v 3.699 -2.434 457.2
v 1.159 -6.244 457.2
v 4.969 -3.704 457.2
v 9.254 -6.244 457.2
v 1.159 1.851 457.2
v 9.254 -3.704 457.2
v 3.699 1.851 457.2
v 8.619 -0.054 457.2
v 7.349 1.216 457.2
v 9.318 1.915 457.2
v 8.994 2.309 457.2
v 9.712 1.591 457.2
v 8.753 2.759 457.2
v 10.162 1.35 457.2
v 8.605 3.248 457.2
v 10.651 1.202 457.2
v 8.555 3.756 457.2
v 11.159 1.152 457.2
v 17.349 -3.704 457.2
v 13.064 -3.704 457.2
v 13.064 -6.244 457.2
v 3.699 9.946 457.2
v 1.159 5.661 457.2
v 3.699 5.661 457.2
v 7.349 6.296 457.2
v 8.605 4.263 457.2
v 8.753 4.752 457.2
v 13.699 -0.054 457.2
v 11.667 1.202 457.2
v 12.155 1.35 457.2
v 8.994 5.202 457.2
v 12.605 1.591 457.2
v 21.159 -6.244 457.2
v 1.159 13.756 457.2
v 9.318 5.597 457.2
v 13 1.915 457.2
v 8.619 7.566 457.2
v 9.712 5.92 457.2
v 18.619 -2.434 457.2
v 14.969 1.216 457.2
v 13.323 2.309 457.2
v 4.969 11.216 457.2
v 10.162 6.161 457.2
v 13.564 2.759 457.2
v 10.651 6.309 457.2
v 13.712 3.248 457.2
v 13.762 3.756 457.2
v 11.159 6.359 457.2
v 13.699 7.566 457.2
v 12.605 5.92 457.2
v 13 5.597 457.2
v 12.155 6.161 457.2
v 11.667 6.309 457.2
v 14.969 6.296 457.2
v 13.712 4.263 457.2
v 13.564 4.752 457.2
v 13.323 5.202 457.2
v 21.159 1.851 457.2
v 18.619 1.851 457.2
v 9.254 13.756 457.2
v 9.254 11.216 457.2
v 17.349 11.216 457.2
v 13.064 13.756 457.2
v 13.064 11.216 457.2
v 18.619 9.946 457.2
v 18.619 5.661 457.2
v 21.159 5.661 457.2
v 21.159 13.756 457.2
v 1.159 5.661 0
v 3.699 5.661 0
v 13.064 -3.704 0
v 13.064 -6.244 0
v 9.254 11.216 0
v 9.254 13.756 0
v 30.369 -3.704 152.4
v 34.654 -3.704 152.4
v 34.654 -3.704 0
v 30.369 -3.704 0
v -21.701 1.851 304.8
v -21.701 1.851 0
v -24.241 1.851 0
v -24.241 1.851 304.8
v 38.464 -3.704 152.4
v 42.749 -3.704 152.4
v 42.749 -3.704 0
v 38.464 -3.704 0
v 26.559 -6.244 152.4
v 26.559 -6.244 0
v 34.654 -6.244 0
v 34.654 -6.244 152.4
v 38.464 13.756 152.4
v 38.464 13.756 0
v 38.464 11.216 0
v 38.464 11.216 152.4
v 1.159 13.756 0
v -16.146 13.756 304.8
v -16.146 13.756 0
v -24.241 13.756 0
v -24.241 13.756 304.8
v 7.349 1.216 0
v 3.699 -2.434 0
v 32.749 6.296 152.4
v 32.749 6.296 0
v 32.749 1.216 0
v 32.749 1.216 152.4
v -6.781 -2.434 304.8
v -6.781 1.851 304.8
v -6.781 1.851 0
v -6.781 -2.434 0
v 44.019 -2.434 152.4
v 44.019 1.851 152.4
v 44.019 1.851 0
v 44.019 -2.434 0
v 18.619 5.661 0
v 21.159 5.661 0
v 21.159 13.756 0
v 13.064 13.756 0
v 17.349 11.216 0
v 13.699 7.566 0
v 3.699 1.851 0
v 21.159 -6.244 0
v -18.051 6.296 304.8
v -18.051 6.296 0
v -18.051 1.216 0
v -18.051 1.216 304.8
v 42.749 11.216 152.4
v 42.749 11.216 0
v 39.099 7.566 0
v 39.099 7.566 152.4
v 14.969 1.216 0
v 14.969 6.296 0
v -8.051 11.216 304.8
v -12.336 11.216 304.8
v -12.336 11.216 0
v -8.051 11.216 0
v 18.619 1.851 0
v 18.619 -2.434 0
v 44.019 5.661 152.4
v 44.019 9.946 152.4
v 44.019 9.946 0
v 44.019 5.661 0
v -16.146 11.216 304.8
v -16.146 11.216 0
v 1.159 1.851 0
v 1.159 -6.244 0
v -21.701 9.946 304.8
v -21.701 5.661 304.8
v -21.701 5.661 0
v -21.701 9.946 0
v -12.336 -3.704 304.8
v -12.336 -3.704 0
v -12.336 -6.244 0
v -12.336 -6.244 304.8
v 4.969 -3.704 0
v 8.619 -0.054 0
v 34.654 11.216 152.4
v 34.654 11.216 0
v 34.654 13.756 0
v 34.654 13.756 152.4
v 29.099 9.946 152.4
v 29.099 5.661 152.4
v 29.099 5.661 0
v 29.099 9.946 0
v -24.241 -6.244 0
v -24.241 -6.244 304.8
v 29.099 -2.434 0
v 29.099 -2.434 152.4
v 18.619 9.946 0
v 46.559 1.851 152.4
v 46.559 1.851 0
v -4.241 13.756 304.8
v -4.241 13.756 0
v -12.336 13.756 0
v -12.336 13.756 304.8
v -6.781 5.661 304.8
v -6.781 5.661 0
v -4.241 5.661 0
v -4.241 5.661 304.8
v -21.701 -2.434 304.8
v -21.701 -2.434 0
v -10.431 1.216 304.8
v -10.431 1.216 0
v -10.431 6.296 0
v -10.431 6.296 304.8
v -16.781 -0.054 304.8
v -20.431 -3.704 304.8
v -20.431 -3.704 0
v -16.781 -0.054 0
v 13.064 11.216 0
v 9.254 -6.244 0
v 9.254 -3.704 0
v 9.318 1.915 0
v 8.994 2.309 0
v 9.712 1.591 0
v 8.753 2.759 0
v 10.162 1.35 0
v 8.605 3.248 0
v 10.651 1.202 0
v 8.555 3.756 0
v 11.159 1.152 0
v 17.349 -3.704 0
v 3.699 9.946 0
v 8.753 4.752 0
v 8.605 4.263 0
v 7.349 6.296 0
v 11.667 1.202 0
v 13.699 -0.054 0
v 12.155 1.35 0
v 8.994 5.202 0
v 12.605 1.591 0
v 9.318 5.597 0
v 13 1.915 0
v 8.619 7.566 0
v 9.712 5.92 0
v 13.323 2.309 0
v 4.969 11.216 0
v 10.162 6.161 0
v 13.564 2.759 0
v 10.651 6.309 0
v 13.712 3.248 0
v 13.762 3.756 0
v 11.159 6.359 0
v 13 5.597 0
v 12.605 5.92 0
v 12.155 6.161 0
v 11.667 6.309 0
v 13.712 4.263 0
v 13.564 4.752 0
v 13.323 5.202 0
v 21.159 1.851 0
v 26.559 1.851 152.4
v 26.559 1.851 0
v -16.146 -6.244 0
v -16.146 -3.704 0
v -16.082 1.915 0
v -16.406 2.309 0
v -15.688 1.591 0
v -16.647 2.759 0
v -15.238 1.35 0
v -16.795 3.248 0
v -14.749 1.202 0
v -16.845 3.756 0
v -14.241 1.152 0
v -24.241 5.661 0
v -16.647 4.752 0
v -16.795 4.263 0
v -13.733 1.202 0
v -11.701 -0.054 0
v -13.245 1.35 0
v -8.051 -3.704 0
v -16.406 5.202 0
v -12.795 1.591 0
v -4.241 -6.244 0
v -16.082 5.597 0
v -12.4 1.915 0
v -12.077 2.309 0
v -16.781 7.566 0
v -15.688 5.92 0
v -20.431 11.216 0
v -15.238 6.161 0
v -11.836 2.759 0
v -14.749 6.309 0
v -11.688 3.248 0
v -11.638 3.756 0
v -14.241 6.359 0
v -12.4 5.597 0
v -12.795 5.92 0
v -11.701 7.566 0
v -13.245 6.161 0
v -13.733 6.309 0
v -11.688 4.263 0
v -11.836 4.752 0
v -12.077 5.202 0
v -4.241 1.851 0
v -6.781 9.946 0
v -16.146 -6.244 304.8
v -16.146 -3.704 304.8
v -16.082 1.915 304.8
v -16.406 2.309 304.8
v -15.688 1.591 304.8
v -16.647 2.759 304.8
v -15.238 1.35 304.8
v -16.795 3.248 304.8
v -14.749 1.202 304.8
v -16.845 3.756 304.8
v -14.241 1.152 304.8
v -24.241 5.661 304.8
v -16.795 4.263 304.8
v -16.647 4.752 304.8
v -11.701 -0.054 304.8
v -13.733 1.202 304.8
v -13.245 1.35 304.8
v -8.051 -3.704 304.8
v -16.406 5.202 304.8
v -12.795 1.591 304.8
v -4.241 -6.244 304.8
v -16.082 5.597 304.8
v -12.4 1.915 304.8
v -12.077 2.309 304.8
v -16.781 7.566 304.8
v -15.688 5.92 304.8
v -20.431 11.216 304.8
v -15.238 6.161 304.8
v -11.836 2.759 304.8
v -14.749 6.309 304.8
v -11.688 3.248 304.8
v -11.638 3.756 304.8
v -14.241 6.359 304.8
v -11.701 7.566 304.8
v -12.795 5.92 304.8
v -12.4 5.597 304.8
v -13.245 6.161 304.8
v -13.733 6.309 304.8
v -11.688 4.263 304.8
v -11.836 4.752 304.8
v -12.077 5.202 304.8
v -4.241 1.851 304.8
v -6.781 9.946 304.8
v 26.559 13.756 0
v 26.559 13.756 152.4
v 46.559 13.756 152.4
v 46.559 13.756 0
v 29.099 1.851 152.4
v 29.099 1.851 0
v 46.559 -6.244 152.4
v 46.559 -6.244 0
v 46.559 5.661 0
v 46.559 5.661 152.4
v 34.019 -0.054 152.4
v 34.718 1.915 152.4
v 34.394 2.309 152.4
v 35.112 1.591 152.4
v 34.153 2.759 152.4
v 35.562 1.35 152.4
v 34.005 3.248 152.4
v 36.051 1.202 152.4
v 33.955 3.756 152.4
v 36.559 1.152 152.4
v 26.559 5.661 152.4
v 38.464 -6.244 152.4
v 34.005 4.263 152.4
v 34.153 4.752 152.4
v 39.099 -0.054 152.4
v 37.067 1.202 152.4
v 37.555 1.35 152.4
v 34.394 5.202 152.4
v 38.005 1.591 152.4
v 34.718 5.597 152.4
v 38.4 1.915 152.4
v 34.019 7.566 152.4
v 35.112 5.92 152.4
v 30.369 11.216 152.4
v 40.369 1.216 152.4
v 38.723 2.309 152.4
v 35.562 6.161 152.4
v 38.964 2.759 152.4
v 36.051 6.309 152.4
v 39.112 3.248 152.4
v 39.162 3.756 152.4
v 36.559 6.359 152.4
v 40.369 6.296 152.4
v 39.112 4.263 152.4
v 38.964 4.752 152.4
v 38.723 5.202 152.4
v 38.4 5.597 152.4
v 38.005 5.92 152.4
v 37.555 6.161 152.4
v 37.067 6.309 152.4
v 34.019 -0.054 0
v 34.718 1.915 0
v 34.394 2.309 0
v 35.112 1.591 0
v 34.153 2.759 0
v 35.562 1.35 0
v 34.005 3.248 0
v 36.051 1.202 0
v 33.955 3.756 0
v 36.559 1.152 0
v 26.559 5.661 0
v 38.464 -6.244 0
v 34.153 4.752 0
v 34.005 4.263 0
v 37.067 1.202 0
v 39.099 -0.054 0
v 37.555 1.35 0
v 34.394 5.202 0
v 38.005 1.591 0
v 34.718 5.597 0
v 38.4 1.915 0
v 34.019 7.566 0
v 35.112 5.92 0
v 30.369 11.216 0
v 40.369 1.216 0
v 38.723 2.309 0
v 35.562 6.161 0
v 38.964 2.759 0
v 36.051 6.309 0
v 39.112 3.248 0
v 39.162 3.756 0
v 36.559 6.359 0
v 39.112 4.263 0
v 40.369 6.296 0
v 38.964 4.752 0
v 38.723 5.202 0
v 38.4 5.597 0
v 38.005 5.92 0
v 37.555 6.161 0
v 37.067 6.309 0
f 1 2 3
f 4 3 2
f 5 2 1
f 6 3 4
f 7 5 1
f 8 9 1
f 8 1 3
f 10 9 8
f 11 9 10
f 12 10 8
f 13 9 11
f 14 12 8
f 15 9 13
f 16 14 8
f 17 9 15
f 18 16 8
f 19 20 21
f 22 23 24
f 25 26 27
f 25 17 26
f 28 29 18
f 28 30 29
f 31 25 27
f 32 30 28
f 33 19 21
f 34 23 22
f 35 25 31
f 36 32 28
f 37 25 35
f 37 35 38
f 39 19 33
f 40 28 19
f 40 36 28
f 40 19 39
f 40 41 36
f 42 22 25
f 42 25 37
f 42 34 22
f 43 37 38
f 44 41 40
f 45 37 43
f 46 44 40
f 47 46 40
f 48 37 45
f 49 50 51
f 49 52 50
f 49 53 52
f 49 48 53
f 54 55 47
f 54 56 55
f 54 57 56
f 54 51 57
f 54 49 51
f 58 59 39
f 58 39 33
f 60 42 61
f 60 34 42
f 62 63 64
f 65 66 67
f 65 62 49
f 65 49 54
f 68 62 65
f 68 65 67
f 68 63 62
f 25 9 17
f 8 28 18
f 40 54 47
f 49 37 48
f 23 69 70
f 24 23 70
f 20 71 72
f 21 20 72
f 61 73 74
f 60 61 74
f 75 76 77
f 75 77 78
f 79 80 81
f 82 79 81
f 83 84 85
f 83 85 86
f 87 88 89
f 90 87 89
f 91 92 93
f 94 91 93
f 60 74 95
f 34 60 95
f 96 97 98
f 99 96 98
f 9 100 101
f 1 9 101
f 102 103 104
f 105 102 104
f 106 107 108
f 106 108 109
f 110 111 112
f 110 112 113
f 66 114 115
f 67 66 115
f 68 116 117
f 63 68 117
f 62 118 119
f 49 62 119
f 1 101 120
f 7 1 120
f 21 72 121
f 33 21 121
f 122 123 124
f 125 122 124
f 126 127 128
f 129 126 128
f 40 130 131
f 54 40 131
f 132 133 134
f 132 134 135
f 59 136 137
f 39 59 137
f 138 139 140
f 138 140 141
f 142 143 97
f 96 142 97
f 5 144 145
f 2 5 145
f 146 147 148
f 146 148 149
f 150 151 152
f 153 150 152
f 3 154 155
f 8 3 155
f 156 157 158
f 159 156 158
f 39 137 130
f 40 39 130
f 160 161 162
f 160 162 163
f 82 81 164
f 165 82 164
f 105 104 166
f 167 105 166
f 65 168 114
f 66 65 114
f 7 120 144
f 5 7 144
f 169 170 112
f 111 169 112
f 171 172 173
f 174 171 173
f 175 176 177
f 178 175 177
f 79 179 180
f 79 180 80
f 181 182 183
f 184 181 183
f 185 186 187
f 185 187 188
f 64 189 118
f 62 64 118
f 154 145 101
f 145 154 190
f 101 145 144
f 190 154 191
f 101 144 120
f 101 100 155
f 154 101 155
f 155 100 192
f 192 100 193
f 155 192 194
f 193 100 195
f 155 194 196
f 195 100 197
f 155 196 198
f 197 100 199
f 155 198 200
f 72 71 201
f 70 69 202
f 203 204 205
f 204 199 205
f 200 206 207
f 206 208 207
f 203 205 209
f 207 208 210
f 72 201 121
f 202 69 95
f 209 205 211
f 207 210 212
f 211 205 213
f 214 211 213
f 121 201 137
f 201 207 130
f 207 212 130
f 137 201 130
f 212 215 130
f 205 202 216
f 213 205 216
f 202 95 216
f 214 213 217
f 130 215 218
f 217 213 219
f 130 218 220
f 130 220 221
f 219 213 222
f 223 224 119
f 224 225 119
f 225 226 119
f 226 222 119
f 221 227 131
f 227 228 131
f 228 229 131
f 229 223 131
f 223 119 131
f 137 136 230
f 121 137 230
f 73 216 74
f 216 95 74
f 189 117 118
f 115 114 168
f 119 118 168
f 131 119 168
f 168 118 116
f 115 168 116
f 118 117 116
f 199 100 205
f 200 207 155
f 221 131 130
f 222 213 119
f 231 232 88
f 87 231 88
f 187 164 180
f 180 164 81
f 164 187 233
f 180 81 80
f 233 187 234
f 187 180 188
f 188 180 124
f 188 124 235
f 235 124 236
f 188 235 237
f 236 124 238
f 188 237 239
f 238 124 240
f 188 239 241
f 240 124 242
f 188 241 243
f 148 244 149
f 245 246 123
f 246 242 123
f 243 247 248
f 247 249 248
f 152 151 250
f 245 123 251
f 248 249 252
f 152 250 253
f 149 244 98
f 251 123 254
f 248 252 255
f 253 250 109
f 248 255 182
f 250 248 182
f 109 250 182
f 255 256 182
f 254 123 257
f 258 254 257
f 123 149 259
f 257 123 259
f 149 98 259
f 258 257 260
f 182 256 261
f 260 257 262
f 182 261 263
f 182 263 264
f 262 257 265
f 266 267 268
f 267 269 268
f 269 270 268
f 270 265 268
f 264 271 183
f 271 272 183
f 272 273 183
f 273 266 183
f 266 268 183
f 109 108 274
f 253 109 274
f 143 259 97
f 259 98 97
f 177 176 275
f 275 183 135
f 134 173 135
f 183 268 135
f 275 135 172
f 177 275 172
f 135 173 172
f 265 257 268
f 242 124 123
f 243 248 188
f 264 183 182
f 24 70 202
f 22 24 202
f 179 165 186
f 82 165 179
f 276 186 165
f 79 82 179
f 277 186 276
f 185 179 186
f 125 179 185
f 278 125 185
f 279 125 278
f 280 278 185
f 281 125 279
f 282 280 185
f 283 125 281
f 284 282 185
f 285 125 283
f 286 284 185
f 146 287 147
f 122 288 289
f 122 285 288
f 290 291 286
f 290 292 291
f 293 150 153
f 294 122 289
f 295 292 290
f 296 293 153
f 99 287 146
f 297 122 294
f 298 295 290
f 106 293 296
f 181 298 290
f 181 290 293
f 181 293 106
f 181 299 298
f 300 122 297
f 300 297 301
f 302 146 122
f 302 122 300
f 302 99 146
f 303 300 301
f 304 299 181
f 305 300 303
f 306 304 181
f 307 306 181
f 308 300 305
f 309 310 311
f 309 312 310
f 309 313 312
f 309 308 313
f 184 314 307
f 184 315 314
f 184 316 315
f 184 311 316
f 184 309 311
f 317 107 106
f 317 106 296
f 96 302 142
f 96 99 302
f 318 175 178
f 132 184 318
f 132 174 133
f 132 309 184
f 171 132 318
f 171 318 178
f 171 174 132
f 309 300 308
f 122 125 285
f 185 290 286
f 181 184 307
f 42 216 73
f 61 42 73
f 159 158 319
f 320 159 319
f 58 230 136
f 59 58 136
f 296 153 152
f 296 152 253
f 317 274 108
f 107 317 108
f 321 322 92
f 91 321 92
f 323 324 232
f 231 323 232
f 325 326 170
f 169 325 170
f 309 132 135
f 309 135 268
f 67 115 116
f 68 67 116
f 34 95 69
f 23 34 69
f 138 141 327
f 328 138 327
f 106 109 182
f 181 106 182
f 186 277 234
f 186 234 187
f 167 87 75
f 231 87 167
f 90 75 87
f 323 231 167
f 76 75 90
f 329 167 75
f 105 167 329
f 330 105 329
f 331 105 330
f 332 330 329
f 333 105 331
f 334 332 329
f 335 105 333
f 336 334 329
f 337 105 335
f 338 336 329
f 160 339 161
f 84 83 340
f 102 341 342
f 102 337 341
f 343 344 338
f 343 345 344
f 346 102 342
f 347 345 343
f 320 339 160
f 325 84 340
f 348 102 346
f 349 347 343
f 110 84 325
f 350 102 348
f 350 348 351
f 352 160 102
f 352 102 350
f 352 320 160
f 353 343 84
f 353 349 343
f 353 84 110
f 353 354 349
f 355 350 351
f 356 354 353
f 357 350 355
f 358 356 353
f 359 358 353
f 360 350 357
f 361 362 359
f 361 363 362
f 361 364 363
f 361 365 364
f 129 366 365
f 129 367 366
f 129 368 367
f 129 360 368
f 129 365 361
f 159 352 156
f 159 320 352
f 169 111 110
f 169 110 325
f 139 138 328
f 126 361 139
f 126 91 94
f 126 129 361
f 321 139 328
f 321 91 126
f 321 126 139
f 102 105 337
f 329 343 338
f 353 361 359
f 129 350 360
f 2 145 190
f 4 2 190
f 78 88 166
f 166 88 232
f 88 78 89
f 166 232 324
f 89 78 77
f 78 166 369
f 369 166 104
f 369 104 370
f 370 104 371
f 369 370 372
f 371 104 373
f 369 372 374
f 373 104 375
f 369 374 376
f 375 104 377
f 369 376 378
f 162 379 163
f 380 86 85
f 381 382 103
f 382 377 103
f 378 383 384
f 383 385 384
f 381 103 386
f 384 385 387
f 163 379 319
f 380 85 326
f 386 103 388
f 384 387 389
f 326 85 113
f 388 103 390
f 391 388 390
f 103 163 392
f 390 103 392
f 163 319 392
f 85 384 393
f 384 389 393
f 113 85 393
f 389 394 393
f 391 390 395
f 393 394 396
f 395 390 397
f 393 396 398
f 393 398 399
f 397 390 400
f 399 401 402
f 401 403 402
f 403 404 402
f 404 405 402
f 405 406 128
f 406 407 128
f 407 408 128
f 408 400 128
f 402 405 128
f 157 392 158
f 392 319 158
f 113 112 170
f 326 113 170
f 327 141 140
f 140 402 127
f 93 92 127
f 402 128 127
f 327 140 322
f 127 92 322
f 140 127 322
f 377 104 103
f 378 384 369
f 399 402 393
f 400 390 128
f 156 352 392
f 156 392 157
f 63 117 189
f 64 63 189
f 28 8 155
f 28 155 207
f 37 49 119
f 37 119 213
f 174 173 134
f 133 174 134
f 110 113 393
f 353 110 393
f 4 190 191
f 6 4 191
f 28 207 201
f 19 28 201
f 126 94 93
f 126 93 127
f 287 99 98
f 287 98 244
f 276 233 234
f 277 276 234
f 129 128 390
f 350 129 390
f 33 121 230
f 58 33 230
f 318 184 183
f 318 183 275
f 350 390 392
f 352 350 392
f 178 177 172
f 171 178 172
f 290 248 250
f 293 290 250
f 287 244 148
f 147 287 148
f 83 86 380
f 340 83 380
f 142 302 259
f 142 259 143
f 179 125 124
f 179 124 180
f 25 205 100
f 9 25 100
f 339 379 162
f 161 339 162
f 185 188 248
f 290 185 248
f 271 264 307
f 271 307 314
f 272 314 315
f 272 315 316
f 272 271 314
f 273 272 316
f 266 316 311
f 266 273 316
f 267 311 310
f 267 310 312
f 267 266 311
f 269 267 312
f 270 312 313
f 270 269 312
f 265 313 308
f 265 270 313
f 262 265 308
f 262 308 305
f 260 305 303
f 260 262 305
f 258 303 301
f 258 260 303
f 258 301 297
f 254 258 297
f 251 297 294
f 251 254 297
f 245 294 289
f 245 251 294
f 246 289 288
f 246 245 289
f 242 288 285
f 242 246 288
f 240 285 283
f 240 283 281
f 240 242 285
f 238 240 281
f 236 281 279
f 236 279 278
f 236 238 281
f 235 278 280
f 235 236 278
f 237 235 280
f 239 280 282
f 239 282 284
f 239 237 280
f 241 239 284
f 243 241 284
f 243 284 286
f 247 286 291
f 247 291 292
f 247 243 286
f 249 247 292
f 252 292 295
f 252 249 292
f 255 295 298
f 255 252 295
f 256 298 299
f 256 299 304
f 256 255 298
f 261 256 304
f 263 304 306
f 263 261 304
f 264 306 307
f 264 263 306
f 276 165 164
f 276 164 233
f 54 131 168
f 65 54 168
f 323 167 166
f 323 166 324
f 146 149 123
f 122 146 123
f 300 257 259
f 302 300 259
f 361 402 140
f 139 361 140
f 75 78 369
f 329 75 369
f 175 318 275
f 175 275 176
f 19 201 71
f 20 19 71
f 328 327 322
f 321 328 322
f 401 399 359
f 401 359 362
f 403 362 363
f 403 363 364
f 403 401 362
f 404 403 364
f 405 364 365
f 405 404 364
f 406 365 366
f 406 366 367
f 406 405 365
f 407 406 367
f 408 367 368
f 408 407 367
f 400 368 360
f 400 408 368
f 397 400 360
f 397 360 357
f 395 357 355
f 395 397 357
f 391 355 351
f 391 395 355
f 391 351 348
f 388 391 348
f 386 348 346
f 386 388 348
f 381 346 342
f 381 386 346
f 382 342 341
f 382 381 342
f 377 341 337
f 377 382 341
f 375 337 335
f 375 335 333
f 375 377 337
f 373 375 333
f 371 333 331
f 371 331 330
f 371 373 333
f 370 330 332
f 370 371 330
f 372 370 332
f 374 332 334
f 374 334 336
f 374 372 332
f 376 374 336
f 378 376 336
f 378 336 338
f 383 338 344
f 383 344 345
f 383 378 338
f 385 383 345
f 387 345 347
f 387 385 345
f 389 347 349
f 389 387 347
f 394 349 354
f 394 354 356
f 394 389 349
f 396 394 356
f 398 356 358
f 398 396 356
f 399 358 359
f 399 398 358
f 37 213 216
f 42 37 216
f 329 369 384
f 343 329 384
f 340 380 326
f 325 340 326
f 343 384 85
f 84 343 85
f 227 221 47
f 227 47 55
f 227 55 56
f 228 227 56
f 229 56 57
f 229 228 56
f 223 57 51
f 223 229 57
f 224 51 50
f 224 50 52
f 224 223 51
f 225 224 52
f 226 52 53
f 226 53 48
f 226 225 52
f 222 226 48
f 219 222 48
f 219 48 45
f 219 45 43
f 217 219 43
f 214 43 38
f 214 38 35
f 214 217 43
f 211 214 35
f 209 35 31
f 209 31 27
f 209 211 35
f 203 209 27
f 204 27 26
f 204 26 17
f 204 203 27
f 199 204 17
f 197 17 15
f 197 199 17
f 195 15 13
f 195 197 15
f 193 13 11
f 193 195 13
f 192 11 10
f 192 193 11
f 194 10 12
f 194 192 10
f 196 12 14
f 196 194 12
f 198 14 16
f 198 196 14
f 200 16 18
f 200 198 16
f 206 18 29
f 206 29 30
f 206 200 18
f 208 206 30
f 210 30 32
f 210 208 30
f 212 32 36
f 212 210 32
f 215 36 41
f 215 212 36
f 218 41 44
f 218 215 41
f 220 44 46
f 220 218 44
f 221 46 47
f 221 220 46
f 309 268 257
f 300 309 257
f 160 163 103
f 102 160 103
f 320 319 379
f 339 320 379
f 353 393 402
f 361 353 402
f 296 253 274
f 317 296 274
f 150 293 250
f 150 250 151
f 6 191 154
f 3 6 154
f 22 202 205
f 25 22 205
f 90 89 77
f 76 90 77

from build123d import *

# Parameters (mm, degrees)
F0_R     = 2.6035
F1_DEPTH = 304.8
F2_DEPTH = 457.2
F3_DEPTH = 152.4


with BuildPart() as f1:
    # F0 (on Top) → F1 (new body)
    with BuildSketch(Plane.XY):
        Polygon((-11.70134, 7.565552), (-16.78134, 7.565552), (-20.43134, 11.215552), (-16.14634, 11.215552), (-16.14634, 13.755552), (-24.24134, 13.755552), (-24.24134, 5.660552), (-21.70134, 5.660552), (-21.70134, 9.945552), (-18.05134, 6.295552), (-18.05134, 1.215552), (-21.70134, -2.434448), (-21.70134, 1.850552), (-24.24134, 1.850552), (-24.24134, -6.244448), (-16.14634, -6.244448), (-16.14634, -3.704448), (-20.43134, -3.704448), (-16.78134, -0.054448), (-11.70134, -0.054448), (-8.05134, -3.704448), (-12.33634, -3.704448), (-12.33634, -6.244448), (-4.24134, -6.244448), (-4.24134, 1.850552), (-6.78134, 1.850552), (-6.78134, -2.434448), (-10.43134, 1.215552), (-10.43134, 6.295552), (-6.78134, 9.945552), (-6.78134, 5.660552), (-4.24134, 5.660552), (-4.24134, 13.755552), (-12.33634, 13.755552), (-12.33634, 11.215552), (-8.05134, 11.215552), align=None)
        with Locations((-14.24134, 3.755552)):
            Circle(F0_R, mode=Mode.SUBTRACT)
    extrude(amount=F1_DEPTH)


with BuildPart() as f2:
    # F0 (on Top) → F2 (new body)
    with BuildSketch(Plane.XY):
        Polygon((9.25366, 13.755552), (1.15866, 13.755552), (1.15866, 5.660552), (3.69866, 5.660552), (3.69866, 9.945552), (7.34866, 6.295552), (7.34866, 1.215552), (3.69866, -2.434448), (3.69866, 1.850552), (1.15866, 1.850552), (1.15866, -6.244448), (9.25366, -6.244448), (9.25366, -3.704448), (4.96866, -3.704448), (8.61866, -0.054448), (13.69866, -0.054448), (17.34866, -3.704448), (13.06366, -3.704448), (13.06366, -6.244448), (21.15866, -6.244448), (21.15866, 1.850552), (18.61866, 1.850552), (18.61866, -2.434448), (14.96866, 1.215552), (14.96866, 6.295552), (18.61866, 9.945552), (18.61866, 5.660552), (21.15866, 5.660552), (21.15866, 13.755552), (13.06366, 13.755552), (13.06366, 11.215552), (17.34866, 11.215552), (13.69866, 7.565552), (8.61866, 7.565552), (4.96866, 11.215552), (9.25366, 11.215552), align=None)
        with Locations((11.15866, 3.755552)):
            Circle(F0_R, mode=Mode.SUBTRACT)
    extrude(amount=F2_DEPTH)


with BuildPart() as f3:
    # F0 (on Top) → F3 (new body)
    with BuildSketch(Plane.XY):
        Polygon((34.65366, 13.755552), (26.55866, 13.755552), (26.55866, 5.660552), (29.09866, 5.660552), (29.09866, 9.945552), (32.74866, 6.295552), (32.74866, 1.215552), (29.09866, -2.434448), (29.09866, 1.850552), (26.55866, 1.850552), (26.55866, -6.244448), (34.65366, -6.244448), (34.65366, -3.704448), (30.36866, -3.704448), (34.01866, -0.054448), (39.09866, -0.054448), (42.74866, -3.704448), (38.46366, -3.704448), (38.46366, -6.244448), (46.55866, -6.244448), (46.55866, 1.850552), (44.01866, 1.850552), (44.01866, -2.434448), (40.36866, 1.215552), (40.36866, 6.295552), (44.01866, 9.945552), (44.01866, 5.660552), (46.55866, 5.660552), (46.55866, 13.755552), (38.46366, 13.755552), (38.46366, 11.215552), (42.74866, 11.215552), (39.09866, 7.565552), (34.01866, 7.565552), (30.36866, 11.215552), (34.65366, 11.215552), align=None)
        with Locations((36.55866, 3.755552)):
            Circle(F0_R, mode=Mode.SUBTRACT)
    extrude(amount=F3_DEPTH)


solid = Compound([f1.part, f2.part, f3.part])
